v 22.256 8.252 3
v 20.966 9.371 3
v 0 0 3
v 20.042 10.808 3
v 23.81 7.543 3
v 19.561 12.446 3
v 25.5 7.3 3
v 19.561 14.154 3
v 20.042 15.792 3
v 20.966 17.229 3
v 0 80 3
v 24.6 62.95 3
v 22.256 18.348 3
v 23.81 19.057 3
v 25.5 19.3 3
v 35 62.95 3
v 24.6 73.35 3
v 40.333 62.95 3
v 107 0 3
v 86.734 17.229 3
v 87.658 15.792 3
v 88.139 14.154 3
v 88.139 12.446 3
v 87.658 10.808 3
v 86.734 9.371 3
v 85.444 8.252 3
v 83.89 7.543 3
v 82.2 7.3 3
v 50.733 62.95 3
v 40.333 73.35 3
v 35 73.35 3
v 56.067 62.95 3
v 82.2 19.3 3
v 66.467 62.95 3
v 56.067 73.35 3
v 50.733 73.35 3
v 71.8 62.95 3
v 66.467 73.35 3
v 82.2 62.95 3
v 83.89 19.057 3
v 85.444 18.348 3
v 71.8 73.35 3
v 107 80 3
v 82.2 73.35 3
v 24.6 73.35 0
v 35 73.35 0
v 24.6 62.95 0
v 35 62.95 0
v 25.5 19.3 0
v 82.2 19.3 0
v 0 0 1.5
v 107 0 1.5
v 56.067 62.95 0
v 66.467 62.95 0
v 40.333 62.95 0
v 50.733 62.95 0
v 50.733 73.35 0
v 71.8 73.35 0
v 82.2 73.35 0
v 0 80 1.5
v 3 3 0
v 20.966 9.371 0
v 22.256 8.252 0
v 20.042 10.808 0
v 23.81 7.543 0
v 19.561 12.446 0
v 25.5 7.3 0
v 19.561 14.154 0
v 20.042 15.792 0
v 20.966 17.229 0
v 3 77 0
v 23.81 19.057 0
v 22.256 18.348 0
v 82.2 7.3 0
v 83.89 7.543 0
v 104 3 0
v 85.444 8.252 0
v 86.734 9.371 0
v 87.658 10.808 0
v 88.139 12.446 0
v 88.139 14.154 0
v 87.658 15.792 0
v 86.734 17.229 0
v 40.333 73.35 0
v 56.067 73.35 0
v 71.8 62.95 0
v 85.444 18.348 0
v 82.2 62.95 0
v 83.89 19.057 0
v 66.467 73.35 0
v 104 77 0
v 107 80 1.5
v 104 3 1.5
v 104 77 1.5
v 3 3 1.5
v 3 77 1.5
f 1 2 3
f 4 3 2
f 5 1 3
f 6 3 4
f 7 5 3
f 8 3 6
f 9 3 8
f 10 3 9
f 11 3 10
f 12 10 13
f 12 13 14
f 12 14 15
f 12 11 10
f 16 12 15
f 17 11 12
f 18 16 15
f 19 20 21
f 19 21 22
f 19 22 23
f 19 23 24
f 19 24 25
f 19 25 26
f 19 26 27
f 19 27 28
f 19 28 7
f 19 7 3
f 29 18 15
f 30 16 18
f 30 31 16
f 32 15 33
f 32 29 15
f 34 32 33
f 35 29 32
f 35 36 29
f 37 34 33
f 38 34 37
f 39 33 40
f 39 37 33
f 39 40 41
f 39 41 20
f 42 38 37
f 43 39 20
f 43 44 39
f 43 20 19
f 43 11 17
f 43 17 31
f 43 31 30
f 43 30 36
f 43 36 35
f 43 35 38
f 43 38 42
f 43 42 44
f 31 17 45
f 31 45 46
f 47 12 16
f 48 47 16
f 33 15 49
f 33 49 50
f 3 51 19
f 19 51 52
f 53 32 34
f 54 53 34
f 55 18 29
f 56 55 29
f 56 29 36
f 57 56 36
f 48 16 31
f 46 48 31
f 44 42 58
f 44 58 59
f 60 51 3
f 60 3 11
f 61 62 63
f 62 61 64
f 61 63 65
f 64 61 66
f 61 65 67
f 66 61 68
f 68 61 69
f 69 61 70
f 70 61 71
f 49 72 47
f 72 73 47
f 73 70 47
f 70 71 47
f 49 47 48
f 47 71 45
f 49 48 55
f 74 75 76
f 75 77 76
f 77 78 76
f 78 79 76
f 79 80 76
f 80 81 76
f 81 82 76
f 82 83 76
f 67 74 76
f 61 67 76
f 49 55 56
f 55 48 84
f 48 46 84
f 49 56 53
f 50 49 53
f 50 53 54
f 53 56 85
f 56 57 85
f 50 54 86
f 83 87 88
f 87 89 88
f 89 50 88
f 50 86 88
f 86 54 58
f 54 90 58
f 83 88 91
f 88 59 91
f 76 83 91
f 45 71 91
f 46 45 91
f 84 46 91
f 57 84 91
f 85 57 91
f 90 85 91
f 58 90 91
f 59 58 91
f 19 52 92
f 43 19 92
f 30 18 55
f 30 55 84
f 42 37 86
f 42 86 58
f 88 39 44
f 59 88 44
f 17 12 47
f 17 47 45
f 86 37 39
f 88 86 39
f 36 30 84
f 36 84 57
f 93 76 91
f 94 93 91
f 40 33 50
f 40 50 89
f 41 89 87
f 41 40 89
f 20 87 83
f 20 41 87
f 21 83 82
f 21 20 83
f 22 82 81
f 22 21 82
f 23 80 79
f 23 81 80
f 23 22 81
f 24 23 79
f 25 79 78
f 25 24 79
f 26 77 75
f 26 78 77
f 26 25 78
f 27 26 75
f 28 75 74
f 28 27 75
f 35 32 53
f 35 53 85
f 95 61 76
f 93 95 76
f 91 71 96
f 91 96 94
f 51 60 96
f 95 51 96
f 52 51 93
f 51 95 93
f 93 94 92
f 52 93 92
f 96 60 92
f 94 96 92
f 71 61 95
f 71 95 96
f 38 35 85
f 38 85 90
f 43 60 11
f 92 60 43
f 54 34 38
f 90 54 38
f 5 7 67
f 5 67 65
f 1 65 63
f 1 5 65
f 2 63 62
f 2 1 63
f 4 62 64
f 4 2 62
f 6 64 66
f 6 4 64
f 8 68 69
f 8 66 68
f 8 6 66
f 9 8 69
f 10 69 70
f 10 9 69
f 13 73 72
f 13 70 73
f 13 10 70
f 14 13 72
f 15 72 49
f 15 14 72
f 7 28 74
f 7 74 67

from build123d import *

# Parameters (mm, degrees)
SKETCH_1_W          = 101
SKETCH_1_H          = 74
EXTRUDE_1_DEPTH     = 3
EXTRUDE_START       = 1.5
SKETCH_2_W          = 107
SKETCH_2_H          = 80
EXTRUDE_2_DEPTH     = 1.5
SKETCH_3_W          = 10.4
SKETCH_3_H          = 10.4
CUT_EXTRUDE_1_DEPTH = 5


with BuildPart() as part:
    # Эскиз1 → Бобышка-Вытянуть1 (new body)
    with BuildSketch(Plane.XY):
        with Locations((53.5, 40)):
            Rectangle(SKETCH_1_W, SKETCH_1_H)
    extrude(amount=EXTRUDE_1_DEPTH)

    # Эскиз2 → Бобышка-Вытянуть2 (add)
    with BuildSketch(Plane.XY.offset(EXTRUDE_START)):
        with Locations((53.5, 40)):
            Rectangle(SKETCH_2_W, SKETCH_2_H)
    extrude(amount=EXTRUDE_2_DEPTH)

    # Эскиз3 → Вырез-Вытянуть1 (cut)
    with BuildSketch(Plane.XY.offset(3)):
        with Locations((29.8, 68.15)):
            Rectangle(SKETCH_3_W, SKETCH_3_H)
        with Locations((45.533, 68.15)):
            Rectangle(SKETCH_3_W, SKETCH_3_H)
        with Locations((61.267, 68.15)):
            Rectangle(SKETCH_3_W, SKETCH_3_H)
        with Locations((77, 68.15)):
            Rectangle(SKETCH_3_W, SKETCH_3_H)
        with BuildLine():
            Line((25.5, 19.3), (82.2, 19.3))
            ThreePointArc((82.2, 19.3), (88.2, 13.3), (82.2, 7.3))
            Line((82.2, 7.3), (25.5, 7.3))
            ThreePointArc((25.5, 7.3), (19.5, 13.3), (25.5, 19.3))
        make_face()
    extrude(amount=-CUT_EXTRUDE_1_DEPTH, mode=Mode.SUBTRACT)


solid = part.part
